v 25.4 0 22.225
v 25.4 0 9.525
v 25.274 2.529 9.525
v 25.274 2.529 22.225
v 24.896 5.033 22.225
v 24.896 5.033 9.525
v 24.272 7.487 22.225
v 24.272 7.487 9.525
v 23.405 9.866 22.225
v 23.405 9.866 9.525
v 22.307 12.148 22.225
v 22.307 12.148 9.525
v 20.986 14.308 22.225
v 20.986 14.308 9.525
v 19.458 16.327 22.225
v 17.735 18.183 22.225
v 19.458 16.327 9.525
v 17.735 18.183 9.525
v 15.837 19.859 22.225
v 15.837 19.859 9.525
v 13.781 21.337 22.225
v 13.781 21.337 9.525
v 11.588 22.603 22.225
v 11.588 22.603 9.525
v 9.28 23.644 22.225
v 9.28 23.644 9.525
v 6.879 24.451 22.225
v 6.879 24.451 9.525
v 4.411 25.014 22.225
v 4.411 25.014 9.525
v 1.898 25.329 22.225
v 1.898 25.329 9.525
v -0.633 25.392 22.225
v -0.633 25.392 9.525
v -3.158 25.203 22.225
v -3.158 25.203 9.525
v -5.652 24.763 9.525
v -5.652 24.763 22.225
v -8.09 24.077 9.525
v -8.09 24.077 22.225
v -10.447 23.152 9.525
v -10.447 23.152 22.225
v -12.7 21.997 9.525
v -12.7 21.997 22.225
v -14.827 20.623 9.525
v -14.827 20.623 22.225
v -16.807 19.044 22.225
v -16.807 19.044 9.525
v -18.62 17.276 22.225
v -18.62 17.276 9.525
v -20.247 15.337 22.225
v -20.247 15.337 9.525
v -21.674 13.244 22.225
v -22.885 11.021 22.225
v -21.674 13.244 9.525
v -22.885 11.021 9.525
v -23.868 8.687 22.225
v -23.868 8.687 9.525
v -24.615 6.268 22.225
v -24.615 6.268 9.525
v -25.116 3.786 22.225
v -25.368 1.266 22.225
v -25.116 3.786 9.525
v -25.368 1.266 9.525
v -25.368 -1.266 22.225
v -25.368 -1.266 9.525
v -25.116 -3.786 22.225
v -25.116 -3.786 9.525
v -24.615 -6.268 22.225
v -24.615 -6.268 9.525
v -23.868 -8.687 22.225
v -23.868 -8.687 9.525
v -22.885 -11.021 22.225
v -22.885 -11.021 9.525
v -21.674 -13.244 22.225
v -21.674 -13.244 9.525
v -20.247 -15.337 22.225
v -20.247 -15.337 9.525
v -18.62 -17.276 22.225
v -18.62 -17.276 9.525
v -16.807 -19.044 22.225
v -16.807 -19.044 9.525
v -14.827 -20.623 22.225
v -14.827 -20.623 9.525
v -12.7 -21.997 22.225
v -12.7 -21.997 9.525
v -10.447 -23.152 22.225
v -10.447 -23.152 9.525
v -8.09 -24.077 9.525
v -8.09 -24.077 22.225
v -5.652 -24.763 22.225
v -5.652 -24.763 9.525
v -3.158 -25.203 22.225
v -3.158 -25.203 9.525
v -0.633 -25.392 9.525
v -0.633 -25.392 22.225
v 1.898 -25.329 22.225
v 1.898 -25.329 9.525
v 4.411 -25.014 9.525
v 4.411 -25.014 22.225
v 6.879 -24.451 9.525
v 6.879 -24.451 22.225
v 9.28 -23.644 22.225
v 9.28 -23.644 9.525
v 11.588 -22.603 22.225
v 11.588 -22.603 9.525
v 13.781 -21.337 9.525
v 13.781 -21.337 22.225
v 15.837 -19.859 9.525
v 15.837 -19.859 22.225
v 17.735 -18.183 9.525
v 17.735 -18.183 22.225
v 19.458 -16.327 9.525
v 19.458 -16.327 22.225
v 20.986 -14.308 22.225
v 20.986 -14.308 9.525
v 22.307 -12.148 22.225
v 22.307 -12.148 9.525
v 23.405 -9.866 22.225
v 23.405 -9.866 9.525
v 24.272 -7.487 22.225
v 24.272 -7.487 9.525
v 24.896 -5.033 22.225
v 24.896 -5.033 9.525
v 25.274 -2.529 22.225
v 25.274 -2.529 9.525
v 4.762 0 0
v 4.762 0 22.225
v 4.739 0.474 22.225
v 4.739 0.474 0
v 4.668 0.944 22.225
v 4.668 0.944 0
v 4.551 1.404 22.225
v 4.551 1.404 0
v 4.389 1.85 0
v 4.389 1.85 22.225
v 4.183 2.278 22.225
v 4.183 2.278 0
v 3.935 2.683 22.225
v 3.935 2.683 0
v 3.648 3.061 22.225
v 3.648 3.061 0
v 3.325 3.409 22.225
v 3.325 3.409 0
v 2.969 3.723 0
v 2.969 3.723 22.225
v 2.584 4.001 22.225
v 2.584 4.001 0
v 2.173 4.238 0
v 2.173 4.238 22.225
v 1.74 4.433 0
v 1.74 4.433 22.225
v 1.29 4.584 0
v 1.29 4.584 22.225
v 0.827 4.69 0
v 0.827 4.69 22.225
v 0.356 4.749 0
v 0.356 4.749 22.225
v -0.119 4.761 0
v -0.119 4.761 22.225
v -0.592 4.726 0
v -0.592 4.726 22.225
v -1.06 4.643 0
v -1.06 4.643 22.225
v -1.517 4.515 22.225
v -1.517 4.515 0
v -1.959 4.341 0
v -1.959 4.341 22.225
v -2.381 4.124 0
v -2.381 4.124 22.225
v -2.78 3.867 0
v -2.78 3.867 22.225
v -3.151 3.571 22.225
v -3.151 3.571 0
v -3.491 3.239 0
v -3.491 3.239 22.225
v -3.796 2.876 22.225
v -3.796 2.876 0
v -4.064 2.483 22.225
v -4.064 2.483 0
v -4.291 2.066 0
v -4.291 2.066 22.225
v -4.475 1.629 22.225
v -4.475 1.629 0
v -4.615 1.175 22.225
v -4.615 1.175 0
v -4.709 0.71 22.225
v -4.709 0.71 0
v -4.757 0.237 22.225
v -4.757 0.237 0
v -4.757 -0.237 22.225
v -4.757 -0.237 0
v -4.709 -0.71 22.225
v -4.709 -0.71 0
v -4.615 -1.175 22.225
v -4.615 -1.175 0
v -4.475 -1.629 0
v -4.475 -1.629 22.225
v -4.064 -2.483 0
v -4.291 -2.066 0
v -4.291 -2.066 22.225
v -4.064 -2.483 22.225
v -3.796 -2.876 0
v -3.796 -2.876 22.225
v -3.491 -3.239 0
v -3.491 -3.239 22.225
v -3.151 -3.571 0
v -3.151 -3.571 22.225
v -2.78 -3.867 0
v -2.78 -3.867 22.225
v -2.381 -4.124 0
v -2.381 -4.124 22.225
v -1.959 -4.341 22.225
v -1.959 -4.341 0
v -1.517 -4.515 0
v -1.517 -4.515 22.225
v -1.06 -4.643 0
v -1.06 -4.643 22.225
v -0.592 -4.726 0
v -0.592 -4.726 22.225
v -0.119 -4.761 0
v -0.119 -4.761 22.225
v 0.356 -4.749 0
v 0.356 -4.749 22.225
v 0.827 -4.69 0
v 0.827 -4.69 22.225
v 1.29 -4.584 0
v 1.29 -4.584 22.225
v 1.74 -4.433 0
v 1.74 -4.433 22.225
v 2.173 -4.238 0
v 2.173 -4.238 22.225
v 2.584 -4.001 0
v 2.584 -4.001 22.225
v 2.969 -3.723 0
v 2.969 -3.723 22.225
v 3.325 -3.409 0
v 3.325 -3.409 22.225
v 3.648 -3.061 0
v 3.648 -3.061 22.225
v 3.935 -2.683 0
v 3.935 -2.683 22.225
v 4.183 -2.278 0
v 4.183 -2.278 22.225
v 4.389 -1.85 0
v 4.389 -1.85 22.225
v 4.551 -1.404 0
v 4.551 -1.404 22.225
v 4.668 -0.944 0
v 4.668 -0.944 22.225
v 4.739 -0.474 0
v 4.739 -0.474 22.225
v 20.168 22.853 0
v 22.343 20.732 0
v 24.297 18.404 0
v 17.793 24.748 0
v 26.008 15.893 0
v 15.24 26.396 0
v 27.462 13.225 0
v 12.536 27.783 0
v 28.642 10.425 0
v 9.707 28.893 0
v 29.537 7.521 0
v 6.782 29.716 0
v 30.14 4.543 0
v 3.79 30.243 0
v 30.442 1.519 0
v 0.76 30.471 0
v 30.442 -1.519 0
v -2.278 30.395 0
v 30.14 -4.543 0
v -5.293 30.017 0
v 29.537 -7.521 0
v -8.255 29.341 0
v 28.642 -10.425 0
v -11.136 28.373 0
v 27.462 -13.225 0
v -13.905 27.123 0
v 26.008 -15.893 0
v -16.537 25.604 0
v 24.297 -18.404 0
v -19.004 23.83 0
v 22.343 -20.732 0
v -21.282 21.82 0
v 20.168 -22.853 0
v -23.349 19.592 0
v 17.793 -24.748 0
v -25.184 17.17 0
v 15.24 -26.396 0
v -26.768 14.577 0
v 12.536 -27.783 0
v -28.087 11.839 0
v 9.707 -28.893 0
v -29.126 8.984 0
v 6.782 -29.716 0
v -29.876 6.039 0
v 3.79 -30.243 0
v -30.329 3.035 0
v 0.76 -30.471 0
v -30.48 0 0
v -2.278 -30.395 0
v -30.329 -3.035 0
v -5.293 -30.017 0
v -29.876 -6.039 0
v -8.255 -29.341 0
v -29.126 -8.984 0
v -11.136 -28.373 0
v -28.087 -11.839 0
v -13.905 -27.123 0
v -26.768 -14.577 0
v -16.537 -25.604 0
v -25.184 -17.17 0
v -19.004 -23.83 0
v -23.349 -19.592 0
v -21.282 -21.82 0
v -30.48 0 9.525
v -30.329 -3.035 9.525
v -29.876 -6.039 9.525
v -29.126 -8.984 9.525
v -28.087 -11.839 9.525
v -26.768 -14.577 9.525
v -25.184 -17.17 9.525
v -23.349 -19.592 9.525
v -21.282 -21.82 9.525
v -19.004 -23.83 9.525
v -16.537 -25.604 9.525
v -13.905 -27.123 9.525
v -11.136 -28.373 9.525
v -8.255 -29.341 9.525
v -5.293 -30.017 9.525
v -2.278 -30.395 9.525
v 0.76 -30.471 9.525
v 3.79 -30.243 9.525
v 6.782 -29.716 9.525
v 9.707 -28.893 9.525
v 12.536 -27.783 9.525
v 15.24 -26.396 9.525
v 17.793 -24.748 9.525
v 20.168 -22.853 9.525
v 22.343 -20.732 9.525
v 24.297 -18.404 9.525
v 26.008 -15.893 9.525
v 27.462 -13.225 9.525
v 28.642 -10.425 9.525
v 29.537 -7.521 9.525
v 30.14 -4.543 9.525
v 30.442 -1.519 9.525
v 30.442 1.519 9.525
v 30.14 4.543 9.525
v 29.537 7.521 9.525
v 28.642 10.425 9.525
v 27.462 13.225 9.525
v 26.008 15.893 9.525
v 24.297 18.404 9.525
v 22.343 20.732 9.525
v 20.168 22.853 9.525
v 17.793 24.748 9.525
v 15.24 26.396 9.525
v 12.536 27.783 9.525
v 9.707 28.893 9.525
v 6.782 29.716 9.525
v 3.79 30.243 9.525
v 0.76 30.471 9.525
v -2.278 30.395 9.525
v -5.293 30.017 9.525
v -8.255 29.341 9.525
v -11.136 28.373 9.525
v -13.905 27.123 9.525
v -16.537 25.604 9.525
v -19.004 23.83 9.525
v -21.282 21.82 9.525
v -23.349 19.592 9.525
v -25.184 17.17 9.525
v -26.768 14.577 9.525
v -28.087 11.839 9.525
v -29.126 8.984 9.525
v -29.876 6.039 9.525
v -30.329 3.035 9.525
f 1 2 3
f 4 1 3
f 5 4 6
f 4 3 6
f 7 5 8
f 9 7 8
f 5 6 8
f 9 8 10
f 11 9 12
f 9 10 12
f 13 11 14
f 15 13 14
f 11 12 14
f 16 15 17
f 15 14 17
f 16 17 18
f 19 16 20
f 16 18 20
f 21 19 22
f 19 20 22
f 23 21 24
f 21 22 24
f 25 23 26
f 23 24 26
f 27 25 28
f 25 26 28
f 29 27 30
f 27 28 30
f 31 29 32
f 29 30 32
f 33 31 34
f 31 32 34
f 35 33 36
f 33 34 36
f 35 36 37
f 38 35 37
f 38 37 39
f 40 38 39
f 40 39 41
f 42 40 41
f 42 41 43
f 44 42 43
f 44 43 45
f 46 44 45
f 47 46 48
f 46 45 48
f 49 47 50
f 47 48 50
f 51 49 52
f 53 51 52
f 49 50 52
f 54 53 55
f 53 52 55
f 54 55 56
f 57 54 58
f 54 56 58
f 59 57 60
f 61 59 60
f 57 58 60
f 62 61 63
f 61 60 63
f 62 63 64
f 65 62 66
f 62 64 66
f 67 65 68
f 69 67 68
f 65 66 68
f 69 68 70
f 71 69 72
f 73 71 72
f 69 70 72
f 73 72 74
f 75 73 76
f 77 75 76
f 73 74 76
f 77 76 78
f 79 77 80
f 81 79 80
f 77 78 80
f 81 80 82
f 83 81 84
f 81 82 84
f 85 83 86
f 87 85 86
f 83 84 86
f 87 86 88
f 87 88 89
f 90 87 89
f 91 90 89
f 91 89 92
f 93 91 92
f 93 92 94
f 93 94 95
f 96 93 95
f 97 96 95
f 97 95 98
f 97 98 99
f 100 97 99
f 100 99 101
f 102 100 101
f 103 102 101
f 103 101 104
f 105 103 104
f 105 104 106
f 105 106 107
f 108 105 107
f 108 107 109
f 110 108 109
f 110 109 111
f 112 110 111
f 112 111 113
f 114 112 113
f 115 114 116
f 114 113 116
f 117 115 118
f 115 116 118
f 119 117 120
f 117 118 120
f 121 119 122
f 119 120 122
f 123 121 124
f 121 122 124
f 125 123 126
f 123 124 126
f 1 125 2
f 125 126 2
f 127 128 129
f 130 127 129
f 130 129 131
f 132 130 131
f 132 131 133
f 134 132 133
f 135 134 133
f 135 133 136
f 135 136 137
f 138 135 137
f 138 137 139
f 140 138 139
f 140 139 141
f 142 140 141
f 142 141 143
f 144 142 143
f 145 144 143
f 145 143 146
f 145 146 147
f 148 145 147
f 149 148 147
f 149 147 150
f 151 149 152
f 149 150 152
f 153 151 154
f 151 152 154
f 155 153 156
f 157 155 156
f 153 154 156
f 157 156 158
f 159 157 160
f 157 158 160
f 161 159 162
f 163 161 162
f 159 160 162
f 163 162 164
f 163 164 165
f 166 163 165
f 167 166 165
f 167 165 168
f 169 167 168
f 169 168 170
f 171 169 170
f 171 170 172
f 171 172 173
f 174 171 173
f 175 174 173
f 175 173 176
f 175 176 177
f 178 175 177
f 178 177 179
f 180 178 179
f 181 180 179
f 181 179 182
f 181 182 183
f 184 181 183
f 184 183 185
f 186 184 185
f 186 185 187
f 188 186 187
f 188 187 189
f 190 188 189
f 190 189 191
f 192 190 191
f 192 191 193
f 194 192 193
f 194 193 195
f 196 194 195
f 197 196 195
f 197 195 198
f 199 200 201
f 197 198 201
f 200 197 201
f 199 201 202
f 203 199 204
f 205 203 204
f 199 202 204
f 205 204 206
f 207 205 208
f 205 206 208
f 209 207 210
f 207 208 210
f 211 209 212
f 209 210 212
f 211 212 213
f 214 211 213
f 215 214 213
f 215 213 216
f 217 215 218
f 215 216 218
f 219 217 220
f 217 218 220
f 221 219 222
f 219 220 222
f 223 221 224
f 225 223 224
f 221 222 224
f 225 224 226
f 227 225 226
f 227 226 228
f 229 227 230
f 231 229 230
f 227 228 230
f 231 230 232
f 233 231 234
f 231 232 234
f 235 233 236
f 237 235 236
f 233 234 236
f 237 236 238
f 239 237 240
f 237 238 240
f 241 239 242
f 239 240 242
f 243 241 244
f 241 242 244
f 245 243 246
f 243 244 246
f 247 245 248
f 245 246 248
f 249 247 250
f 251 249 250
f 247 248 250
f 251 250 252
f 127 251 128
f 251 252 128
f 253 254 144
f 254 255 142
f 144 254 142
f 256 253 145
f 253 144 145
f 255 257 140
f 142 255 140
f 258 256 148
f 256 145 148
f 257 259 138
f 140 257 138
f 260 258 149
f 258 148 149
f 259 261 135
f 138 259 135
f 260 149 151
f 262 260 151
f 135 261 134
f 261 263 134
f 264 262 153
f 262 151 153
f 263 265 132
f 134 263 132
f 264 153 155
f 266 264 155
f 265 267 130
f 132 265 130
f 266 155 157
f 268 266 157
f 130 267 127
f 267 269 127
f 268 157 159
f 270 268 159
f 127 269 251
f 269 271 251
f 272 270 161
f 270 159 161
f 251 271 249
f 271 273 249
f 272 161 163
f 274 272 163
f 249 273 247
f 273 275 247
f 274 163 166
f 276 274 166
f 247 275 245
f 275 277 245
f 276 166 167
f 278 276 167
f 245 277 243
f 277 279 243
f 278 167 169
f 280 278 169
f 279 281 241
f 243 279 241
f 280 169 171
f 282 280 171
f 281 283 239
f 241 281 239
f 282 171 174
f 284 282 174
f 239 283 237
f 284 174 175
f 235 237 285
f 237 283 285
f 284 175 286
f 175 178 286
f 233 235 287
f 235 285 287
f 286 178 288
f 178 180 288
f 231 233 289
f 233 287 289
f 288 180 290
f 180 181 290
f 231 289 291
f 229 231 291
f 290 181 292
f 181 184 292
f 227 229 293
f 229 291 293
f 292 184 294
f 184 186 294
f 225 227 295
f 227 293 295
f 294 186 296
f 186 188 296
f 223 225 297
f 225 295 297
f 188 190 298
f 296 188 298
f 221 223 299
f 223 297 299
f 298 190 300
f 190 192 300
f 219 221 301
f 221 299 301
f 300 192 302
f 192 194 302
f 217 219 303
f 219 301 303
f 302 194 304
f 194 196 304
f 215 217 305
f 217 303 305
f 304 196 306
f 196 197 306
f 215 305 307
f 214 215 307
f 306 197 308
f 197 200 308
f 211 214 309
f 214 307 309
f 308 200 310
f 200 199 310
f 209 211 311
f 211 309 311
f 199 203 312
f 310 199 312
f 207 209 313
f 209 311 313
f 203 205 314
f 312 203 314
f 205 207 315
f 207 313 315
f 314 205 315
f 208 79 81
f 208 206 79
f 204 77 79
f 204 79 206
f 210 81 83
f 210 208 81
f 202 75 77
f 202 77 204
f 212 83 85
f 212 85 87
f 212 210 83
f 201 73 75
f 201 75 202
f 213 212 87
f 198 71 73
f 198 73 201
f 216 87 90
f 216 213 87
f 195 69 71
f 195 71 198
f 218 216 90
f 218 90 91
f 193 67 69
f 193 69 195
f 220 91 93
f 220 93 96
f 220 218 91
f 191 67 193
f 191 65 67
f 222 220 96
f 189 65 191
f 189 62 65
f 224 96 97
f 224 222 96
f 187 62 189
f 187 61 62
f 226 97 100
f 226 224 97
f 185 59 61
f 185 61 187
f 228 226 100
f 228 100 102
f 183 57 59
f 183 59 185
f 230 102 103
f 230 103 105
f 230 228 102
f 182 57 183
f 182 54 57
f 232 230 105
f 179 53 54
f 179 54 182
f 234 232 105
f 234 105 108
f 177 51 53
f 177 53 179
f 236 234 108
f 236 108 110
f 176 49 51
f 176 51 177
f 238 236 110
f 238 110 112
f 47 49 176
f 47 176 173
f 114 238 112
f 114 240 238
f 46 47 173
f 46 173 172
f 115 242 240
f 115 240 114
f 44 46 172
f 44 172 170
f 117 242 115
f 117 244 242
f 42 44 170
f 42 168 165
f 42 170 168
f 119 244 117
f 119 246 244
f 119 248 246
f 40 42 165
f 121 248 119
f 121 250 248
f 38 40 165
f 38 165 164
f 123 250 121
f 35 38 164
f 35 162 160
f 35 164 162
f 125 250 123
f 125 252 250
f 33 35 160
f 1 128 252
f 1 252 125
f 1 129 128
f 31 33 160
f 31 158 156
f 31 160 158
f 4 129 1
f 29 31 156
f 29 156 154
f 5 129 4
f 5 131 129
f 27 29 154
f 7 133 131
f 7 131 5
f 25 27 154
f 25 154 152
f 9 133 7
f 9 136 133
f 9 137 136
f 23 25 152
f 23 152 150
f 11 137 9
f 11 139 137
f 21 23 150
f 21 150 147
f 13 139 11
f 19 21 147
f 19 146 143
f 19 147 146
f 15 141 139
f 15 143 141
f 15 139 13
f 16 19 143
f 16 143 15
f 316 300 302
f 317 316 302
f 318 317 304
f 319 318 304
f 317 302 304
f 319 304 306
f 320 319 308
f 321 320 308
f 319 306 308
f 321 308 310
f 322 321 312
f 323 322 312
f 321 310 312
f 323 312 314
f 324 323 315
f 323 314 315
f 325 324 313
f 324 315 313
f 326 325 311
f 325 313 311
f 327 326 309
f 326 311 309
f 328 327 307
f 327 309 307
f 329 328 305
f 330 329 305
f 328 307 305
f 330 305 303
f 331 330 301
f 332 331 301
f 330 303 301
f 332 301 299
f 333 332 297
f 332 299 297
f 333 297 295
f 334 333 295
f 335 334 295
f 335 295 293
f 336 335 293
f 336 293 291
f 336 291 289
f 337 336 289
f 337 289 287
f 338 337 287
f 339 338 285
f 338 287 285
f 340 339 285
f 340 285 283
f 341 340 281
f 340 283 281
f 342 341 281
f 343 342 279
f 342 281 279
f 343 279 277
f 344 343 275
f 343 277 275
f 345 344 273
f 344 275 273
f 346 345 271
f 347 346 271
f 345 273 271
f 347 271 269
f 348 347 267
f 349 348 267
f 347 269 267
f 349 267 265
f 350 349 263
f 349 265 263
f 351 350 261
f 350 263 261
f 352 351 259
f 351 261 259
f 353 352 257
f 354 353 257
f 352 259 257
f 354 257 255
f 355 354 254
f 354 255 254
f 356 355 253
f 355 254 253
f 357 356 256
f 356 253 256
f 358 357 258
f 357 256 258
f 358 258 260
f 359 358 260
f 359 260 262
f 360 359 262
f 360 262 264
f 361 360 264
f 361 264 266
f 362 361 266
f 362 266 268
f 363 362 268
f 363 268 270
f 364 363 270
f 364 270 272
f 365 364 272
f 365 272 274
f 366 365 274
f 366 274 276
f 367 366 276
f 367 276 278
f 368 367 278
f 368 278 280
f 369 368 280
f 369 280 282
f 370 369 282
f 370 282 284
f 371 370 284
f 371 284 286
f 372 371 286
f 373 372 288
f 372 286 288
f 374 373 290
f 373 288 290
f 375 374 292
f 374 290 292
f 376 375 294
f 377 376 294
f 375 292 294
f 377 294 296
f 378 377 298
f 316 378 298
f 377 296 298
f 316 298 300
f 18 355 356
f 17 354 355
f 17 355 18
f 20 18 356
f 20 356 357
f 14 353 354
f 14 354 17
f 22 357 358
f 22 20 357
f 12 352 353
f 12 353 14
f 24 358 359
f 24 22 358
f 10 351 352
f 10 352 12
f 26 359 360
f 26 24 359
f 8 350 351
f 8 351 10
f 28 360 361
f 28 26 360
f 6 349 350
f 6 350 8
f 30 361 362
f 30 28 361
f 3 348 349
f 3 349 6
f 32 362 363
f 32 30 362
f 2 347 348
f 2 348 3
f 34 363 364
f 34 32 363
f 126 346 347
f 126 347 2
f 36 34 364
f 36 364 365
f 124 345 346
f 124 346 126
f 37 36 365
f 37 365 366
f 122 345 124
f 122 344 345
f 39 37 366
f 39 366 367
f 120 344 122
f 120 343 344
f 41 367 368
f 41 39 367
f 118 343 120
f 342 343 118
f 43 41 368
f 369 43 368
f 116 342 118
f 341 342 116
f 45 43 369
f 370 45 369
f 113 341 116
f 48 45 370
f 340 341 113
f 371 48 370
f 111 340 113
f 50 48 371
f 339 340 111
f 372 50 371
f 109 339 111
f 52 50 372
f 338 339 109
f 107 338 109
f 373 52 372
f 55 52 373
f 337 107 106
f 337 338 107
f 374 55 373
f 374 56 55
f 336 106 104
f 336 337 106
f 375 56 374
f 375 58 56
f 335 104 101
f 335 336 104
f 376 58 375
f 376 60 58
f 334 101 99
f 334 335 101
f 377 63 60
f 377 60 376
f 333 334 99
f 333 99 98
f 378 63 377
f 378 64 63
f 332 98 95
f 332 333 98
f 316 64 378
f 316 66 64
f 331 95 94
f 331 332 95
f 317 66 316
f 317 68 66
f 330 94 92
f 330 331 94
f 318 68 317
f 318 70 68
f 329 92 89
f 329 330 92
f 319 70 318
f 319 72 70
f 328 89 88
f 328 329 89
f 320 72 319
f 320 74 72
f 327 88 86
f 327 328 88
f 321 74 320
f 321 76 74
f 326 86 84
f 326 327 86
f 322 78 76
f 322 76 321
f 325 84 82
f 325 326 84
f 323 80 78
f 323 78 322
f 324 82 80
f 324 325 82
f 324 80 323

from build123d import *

# Parameters (mm, degrees)
SKETCH1_R           = 30.48
BOSS_EXTRUDE1_DEPTH = 9.525
SKETCH2_R           = 25.4
BOSS_EXTRUDE2_DEPTH = 12.7
SKETCH3_R           = 4.7625
CUT_EXTRUDE1_DEPTH  = 49.497540402


with BuildPart() as part:
    # Sketch1 → Boss-Extrude1 (new body)
    with BuildSketch(Plane.XY):
        with Locations(Location((0, 0, 0), (0, 0, 180))):
            Circle(SKETCH1_R)
    extrude(amount=BOSS_EXTRUDE1_DEPTH)

    # Sketch2 → Boss-Extrude2 (add)
    with BuildSketch(Plane.XY.offset(9.525)):
        Circle(SKETCH2_R)
    extrude(amount=BOSS_EXTRUDE2_DEPTH)

    # Sketch3 → Cut-Extrude1 (cut, through all)
    with BuildSketch(Plane.XY.offset(22.225)):
        Circle(SKETCH3_R)
    extrude(amount=-CUT_EXTRUDE1_DEPTH, mode=Mode.SUBTRACT)


solid = part.part
